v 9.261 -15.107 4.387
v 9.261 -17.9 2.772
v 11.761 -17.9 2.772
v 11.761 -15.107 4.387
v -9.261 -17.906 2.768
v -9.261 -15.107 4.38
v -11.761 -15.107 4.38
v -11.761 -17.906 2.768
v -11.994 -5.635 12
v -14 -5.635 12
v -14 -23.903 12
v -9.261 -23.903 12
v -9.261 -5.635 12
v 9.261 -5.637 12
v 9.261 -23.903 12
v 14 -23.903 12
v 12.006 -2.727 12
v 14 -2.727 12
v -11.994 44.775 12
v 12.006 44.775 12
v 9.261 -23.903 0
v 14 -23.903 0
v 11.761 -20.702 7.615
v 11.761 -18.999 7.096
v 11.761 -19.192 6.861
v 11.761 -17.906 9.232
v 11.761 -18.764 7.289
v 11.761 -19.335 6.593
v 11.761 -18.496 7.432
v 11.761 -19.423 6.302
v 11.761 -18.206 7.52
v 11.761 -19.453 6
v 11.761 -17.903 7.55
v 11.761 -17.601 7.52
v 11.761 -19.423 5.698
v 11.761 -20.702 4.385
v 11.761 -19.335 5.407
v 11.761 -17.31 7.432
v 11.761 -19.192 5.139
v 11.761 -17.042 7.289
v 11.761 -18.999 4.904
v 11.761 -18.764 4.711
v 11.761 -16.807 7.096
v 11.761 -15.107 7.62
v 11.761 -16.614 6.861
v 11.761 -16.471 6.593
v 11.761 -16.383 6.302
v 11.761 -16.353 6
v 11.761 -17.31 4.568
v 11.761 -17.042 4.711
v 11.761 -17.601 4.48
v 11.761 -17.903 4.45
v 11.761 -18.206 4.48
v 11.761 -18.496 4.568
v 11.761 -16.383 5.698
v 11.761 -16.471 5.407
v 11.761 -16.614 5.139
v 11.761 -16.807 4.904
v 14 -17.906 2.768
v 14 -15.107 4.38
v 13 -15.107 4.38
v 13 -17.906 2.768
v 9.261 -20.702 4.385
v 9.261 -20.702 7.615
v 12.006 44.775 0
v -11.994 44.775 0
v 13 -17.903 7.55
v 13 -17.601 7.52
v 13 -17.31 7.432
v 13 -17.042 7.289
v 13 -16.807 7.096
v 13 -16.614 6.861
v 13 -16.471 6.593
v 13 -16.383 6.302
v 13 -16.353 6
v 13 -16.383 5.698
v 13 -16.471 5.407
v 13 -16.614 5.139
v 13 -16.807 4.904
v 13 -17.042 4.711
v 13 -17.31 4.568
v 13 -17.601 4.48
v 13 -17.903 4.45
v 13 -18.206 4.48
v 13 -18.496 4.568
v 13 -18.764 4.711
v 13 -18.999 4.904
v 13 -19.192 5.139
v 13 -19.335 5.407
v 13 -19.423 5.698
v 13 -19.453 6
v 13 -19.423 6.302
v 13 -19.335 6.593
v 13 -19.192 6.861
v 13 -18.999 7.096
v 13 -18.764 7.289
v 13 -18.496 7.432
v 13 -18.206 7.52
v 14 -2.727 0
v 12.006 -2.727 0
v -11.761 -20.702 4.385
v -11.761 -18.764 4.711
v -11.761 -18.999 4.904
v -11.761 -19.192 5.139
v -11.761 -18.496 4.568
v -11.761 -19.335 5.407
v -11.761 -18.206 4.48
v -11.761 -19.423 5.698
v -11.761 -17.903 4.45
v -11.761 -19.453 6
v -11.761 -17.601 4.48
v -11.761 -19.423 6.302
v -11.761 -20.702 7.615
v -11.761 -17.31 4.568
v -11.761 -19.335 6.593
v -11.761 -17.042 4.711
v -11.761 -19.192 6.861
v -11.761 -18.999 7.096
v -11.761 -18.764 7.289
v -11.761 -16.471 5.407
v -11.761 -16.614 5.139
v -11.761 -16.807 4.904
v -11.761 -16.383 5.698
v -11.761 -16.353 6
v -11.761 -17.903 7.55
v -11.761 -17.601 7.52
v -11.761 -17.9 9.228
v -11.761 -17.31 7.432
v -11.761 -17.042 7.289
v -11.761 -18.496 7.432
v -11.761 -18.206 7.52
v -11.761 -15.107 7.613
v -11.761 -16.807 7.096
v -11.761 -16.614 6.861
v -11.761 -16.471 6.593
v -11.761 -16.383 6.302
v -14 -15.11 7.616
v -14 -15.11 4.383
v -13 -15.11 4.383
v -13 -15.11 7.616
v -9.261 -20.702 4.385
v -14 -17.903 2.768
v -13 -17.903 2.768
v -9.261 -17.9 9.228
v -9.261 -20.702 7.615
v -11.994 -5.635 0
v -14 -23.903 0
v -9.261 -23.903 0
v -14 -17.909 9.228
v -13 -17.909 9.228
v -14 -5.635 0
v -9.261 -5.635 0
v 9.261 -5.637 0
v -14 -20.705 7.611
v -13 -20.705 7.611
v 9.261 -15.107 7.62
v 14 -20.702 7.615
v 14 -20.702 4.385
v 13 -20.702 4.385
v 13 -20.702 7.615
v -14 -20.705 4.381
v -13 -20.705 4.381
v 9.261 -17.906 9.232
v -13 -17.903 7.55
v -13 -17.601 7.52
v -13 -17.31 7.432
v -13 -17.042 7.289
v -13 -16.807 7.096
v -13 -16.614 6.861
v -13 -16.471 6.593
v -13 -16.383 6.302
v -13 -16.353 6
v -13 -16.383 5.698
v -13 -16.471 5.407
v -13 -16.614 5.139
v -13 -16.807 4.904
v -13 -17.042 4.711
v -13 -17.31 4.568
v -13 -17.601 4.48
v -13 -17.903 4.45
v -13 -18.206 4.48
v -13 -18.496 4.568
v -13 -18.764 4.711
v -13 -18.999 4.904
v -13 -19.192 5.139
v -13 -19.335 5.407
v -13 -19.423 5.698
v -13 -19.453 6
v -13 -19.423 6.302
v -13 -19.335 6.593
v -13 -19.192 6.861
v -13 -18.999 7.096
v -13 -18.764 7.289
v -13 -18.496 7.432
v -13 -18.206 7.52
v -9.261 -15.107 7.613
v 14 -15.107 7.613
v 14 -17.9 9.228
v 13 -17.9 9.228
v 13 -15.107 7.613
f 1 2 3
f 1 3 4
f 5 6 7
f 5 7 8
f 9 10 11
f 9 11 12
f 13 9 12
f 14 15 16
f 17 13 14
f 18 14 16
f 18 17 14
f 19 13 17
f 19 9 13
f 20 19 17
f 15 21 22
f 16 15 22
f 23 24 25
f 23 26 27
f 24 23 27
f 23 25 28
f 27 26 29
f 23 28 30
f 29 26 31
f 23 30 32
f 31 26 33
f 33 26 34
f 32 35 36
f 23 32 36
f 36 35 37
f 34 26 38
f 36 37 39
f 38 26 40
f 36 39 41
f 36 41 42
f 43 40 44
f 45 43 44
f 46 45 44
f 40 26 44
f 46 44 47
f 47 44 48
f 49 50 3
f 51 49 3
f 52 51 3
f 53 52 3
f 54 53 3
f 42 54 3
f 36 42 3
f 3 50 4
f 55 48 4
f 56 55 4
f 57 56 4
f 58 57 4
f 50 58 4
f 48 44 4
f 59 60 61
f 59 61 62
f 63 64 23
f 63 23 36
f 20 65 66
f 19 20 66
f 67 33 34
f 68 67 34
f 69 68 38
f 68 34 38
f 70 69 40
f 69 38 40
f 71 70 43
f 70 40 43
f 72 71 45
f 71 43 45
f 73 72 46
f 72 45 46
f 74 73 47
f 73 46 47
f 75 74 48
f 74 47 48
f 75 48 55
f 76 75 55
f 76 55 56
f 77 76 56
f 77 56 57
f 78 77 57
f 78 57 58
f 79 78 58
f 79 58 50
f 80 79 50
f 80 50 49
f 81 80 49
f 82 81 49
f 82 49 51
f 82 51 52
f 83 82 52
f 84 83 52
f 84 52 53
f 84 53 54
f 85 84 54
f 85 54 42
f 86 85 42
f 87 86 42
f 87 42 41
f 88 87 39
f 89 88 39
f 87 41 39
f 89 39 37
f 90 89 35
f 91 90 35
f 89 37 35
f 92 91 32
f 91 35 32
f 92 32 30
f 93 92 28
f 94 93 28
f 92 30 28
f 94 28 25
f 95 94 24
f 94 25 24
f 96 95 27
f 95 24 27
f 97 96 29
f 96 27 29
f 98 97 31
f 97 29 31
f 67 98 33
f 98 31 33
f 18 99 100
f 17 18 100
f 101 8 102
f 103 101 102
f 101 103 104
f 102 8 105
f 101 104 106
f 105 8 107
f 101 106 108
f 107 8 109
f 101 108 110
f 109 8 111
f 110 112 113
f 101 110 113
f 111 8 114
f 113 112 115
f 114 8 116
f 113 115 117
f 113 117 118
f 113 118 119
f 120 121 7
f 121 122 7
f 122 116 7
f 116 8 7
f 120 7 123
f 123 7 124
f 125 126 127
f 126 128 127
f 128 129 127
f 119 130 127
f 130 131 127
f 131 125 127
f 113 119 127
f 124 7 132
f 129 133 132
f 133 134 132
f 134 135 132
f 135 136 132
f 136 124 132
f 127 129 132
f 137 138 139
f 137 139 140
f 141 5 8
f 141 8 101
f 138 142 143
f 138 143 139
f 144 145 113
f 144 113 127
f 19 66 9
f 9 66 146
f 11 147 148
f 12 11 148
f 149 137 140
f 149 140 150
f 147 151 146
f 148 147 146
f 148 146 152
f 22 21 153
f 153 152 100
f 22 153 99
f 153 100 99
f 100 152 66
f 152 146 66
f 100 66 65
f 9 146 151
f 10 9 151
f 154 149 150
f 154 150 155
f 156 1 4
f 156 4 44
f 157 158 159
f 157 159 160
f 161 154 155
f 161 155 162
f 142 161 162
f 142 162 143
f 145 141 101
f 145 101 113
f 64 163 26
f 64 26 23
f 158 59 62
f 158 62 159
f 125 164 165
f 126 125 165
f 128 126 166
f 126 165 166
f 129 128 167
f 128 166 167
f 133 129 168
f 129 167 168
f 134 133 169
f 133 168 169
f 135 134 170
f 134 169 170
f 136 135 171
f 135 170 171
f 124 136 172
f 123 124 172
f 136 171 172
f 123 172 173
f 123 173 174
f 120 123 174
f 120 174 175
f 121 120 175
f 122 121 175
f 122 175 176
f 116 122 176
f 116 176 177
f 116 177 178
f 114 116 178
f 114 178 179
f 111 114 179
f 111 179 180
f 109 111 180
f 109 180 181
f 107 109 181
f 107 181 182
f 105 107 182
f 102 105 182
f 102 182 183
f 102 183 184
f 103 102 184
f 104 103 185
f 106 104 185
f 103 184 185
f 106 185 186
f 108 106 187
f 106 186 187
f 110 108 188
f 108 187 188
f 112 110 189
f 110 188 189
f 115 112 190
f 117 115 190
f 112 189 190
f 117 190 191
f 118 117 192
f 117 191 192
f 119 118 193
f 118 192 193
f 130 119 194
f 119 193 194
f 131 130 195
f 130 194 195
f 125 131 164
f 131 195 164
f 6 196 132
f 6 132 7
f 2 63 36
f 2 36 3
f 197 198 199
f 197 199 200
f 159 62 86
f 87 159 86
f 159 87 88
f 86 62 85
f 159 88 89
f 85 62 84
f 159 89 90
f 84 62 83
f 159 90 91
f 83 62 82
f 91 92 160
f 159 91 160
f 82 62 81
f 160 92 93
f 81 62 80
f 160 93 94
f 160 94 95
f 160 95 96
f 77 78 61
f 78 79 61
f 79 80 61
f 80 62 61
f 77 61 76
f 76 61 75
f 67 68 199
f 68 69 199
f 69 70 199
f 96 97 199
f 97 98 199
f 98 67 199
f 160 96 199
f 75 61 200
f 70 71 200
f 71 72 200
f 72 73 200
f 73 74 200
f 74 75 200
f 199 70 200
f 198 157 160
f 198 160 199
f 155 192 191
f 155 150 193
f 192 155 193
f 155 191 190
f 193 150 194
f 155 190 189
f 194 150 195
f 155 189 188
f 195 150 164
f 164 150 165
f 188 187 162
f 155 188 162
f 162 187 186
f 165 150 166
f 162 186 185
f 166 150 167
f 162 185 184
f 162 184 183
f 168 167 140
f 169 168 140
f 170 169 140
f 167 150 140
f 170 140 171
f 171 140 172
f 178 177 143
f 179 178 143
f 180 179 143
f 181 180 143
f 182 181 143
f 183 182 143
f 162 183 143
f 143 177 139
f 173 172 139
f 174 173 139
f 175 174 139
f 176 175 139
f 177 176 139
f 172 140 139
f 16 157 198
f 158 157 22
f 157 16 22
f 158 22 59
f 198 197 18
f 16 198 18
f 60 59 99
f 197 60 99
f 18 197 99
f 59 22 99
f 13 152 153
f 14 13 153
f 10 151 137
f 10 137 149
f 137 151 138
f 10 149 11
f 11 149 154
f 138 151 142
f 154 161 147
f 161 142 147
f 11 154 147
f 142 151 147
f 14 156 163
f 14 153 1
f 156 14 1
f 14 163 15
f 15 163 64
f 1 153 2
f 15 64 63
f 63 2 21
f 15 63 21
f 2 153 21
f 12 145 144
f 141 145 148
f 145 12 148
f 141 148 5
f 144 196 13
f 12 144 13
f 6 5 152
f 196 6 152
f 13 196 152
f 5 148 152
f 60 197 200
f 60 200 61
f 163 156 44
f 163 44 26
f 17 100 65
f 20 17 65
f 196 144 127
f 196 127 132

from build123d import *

# Parameters (mm, degrees)
EXTRUDE_1_DEPTH      = 12
CUT_EXTRUDE_12_DEPTH = 1
CUT_EXTRUDE_13_DEPTH = 1
CUT_EXTRUDE_14_DEPTH = 2.5
CUT_EXTRUDE_16_DEPTH = 2.5
SKETCH_26_R          = 1.55
CUT_EXTRUDE_17_DEPTH = 28


with BuildPart() as part:
    # 스케치1 → 보스-돌출1 (new body)
    with BuildSketch(Plane.XY):
        Polygon((-11.994395335, 44.774969809), (-11.994395335, -5.635030191), (-13.999795062, -5.635030191), (-13.999795062, -23.903190191), (-9.261084312, -23.903190191), (-9.261084312, -5.635030191), (9.261494188, -5.637088258), (9.261494188, -23.903190191), (14.000204938, -23.903190191), (14.000204938, -2.727088258), (12.005604665, -2.727088258), (12.005604665, 44.774969809), align=None)
    extrude(amount=EXTRUDE_1_DEPTH)

    # 스케치20 → 컷-돌출12 (cut)
    with BuildSketch(Plane(origin=(14.000204938, 0, 0), x_dir=(0, 0, -1), z_dir=(1, 0, 0))):
        Polygon((-4.384999641, -20.702278724), (-7.614999641, -20.702278724), (-9.228415158, -17.900454093), (-7.61341897, -15.106842492), (-4.380259285, -15.106842492), (-2.768420518, -17.905928971), align=None)
    extrude(amount=-CUT_EXTRUDE_12_DEPTH, mode=Mode.SUBTRACT)

    # 스케치21 → 컷-돌출13 (cut)
    with BuildSketch(Plane.ZY.offset(13.999795062)):
        Polygon((7.611047299, -20.705014823), (4.381047299, -20.705014823), (2.767631782, -17.903190191), (4.38262797, -15.109578591), (7.615787655, -15.109578591), (9.227626422, -17.90866507), align=None)
    extrude(amount=-CUT_EXTRUDE_13_DEPTH, mode=Mode.SUBTRACT)

    # 스케치22 → 컷-돌출14 (cut)
    with BuildSketch(Plane.ZY.offset(-9.261494188)):
        Polygon((7.615000359, -20.702278724), (4.385000359, -20.702278724), (2.771584842, -17.900454093), (4.38658103, -15.106842492), (7.619740715, -15.106842492), (9.231579482, -17.905928971), align=None)
    extrude(amount=-CUT_EXTRUDE_14_DEPTH, mode=Mode.SUBTRACT)

    # 스케치25 → 컷-돌출16 (cut)
    with BuildSketch(Plane(origin=(-9.261084312, 0, 0), x_dir=(0, 0, -1), z_dir=(1, 0, 0))):
        Polygon((-4.384999641, -20.702278724), (-7.614999641, -20.702278724), (-9.228415158, -17.900454093), (-7.61341897, -15.106842492), (-4.380259285, -15.106842492), (-2.768420518, -17.905928971), align=None)
    extrude(amount=-CUT_EXTRUDE_16_DEPTH, mode=Mode.SUBTRACT)

    # 스케치26 → 컷-돌출17 (cut, through all)
    with BuildSketch(Plane.ZY.offset(12.999795062)):
        with Locations((6, -17.903190191)):
            Circle(SKETCH_26_R)
    extrude(amount=-CUT_EXTRUDE_17_DEPTH, mode=Mode.SUBTRACT)


solid = part.part
